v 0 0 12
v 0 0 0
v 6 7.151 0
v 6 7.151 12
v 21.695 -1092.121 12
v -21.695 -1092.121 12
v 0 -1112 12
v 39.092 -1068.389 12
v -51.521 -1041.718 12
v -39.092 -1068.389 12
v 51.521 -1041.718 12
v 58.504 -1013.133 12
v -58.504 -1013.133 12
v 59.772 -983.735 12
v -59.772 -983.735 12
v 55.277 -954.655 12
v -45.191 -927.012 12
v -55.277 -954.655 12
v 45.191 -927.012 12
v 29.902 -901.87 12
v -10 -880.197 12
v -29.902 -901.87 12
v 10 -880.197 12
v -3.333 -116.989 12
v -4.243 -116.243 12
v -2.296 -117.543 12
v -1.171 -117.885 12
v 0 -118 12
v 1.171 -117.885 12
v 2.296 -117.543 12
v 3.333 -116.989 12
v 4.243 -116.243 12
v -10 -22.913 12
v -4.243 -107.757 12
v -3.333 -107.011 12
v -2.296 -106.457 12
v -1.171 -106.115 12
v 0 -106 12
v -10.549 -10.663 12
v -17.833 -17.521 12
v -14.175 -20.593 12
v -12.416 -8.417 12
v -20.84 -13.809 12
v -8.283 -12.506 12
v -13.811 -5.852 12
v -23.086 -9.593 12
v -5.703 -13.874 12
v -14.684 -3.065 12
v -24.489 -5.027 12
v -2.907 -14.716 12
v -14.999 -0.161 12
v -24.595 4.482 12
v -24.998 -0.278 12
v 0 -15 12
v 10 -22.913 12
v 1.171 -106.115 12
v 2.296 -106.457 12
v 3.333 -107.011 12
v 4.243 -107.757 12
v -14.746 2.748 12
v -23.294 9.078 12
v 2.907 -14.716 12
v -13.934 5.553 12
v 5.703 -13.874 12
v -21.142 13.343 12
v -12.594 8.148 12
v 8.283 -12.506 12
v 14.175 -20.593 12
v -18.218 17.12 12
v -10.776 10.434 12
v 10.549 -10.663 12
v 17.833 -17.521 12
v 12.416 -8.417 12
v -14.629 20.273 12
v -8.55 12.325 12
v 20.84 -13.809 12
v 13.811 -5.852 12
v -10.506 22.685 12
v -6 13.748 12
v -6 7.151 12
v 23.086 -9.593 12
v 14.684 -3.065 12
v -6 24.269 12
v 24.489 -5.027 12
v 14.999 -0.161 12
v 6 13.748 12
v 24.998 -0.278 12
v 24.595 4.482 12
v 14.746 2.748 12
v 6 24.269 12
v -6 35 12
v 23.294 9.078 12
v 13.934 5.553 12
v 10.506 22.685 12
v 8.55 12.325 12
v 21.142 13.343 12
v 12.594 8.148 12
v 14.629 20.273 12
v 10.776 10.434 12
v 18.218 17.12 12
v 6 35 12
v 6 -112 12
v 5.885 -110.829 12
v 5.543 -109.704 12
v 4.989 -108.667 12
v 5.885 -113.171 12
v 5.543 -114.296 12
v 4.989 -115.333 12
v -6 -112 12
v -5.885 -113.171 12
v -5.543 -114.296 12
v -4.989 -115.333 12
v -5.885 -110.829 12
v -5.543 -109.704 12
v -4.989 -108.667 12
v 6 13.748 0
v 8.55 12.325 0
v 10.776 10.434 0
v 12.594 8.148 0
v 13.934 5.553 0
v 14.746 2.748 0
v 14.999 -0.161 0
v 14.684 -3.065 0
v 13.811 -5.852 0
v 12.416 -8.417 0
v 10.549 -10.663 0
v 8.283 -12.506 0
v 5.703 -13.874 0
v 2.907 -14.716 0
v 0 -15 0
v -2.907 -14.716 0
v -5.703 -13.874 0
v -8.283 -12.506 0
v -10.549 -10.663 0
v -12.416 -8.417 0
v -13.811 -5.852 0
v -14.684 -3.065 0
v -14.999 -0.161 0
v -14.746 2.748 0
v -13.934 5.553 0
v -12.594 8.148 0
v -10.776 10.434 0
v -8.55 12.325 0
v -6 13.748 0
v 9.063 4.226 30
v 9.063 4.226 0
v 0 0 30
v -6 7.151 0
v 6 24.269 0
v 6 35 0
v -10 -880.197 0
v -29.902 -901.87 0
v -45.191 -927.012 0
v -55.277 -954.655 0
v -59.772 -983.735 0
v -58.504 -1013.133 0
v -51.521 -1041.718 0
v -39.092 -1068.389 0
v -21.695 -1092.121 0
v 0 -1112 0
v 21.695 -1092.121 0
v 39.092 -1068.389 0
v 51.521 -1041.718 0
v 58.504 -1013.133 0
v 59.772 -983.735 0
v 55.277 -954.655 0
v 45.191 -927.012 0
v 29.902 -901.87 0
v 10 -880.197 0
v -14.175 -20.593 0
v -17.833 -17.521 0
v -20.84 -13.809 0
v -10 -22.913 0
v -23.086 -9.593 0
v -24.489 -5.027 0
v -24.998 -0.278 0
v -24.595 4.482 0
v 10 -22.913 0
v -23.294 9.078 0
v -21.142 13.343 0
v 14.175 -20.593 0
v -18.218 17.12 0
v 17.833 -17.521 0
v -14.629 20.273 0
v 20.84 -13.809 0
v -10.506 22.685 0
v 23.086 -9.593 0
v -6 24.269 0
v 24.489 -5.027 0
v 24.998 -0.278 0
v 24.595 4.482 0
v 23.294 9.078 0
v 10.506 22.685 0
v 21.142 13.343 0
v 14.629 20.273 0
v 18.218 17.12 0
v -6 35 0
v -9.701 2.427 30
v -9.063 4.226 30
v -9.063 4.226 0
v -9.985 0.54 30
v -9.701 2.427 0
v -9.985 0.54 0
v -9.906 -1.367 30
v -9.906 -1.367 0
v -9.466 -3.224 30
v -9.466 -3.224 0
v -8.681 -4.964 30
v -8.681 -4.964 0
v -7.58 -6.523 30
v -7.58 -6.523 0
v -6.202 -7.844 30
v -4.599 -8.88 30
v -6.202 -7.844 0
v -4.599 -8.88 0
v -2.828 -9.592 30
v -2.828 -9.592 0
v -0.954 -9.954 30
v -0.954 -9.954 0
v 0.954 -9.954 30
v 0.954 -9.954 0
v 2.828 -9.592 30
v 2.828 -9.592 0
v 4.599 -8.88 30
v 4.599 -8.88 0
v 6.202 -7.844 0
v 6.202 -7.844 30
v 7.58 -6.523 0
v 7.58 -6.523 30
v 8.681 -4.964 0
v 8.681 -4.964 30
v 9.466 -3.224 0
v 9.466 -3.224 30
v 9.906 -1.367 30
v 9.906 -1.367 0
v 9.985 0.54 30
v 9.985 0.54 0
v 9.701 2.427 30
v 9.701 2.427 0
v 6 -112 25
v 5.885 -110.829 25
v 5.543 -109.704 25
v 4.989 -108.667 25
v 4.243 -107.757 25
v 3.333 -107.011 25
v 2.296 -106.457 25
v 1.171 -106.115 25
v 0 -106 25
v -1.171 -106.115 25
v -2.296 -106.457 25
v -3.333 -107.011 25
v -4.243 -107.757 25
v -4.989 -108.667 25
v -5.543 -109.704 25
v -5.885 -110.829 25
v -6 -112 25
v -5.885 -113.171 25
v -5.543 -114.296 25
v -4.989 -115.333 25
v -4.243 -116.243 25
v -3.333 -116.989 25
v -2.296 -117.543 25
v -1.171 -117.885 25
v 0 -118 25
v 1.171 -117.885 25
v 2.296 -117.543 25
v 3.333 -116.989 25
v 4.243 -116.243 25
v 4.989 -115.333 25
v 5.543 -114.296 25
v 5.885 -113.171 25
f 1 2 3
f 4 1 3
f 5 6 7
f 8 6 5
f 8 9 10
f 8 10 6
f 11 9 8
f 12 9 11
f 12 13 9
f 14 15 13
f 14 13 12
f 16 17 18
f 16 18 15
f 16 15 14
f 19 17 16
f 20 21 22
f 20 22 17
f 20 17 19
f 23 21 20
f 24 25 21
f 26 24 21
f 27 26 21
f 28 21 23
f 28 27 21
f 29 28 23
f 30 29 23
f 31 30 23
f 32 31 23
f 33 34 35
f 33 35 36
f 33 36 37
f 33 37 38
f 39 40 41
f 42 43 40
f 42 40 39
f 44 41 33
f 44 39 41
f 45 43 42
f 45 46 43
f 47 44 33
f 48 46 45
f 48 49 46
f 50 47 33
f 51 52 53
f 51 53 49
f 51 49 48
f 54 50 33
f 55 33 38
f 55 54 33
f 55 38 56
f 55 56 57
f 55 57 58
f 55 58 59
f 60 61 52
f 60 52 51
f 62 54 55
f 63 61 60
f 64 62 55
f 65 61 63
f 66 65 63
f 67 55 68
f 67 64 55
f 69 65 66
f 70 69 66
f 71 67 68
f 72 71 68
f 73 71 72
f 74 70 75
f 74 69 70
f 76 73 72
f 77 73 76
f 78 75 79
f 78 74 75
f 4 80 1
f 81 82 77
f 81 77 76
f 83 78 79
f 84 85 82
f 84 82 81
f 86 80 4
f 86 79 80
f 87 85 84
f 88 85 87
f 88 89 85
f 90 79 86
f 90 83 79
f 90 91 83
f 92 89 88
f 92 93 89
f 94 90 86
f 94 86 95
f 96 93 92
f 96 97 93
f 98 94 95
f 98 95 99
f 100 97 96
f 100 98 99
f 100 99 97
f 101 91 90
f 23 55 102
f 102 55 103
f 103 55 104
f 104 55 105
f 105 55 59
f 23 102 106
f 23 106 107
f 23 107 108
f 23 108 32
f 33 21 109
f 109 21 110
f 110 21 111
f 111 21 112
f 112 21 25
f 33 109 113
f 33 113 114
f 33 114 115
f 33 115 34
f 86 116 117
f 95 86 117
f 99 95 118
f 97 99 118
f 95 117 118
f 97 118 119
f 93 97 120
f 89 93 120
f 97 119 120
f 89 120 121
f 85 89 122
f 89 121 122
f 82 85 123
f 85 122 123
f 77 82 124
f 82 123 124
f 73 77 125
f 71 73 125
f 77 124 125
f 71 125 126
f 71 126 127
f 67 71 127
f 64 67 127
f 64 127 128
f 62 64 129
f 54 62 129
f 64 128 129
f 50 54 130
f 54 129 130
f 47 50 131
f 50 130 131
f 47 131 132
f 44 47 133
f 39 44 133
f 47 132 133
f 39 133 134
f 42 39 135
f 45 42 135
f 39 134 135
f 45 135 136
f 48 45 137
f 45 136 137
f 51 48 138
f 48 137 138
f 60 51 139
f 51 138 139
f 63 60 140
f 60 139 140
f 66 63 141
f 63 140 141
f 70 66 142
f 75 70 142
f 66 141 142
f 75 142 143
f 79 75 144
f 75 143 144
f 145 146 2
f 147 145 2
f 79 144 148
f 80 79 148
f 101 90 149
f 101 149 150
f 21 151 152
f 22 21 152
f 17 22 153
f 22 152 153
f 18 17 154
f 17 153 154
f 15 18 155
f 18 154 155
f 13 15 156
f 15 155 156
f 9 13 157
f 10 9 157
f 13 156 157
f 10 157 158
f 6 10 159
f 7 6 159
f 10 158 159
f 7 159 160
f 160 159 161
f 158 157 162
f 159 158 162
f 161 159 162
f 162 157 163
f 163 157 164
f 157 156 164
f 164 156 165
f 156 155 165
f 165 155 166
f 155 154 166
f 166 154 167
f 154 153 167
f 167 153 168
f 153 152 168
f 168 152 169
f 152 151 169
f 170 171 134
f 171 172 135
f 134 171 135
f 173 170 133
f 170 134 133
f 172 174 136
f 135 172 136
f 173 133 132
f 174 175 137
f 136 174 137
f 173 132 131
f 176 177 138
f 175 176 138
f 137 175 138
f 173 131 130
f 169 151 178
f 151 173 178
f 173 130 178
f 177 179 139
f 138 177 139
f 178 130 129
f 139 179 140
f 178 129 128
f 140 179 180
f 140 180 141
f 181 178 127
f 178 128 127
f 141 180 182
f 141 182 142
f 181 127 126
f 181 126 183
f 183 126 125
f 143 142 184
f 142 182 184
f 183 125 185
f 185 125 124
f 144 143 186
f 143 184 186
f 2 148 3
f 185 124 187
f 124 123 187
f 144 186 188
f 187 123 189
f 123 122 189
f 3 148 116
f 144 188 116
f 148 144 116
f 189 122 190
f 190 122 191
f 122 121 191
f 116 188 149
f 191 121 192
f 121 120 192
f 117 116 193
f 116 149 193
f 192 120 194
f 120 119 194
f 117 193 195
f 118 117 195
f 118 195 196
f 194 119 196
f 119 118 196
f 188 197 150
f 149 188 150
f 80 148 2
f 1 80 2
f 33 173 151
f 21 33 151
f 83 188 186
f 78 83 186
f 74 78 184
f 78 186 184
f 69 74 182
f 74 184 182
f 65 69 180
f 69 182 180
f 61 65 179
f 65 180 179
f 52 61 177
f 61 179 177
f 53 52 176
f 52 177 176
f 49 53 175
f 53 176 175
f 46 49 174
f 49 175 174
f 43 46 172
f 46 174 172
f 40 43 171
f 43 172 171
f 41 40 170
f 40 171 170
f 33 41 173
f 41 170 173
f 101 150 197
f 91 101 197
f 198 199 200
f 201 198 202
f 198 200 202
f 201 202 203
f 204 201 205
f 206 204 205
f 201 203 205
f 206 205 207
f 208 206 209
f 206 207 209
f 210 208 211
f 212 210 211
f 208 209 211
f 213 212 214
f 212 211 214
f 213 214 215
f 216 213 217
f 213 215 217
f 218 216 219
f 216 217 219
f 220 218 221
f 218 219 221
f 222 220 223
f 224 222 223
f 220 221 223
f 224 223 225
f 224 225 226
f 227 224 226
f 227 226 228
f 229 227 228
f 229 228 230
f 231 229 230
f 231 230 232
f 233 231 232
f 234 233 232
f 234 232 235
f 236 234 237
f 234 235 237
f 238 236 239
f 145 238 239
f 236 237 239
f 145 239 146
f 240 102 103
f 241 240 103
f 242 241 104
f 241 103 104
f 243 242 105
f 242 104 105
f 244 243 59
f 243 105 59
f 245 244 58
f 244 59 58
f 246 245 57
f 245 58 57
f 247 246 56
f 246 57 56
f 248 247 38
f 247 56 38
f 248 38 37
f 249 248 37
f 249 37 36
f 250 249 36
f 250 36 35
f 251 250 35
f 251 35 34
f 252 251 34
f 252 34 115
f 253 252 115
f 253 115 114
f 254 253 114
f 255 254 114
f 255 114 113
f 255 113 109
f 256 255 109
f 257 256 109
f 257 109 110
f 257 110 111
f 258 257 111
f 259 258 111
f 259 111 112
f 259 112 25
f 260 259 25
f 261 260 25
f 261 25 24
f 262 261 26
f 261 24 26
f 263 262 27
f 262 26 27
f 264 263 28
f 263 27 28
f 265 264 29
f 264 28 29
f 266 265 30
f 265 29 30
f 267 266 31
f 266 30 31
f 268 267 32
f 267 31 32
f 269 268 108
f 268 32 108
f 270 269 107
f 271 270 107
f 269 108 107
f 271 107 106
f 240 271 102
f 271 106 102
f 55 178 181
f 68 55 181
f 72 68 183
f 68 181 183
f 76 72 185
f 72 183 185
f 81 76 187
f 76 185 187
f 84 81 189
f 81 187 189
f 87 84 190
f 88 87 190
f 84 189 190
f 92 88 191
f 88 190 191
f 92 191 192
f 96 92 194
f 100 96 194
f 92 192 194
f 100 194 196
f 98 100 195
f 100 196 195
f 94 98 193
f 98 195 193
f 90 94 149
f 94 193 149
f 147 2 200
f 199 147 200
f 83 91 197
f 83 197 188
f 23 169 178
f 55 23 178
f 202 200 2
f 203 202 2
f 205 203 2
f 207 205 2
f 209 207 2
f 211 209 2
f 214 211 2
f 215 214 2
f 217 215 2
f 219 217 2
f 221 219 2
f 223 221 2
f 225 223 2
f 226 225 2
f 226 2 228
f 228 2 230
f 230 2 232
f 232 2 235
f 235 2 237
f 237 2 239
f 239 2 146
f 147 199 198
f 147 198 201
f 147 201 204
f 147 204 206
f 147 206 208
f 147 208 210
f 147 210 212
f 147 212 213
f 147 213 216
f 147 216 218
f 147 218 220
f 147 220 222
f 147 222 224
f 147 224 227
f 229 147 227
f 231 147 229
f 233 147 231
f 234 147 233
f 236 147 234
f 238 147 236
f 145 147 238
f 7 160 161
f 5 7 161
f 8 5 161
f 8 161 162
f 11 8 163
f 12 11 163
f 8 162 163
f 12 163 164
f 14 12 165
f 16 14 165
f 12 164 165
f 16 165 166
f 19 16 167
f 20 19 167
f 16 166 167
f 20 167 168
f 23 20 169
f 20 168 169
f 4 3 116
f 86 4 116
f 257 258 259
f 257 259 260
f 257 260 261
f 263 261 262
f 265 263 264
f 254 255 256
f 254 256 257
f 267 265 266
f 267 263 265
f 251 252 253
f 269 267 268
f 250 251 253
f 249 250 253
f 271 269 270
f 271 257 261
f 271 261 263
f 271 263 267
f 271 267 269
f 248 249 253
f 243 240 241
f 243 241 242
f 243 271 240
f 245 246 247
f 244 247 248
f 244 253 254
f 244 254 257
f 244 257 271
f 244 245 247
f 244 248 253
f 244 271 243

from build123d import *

# Parameters (mm, degrees)
F1_DEPTH = 12
F3_DEPTH = 30
F4_R     = 6
F5_DEPTH = 25


with BuildPart() as f1:
    # F0 (on Top) → F1 (new body)
    with BuildSketch(Plane.XY):
        with BuildLine():
            Line((10, -880.196601), (10, -22.912878))
            ThreePointArc((10, -22.912878), (24.910641, 2.111868), (6, 24.269322))
            Line((6, 24.269322), (6, 35))
            Line((6, 35), (-6, 35))
            Line((-6, 35), (-6, 24.269322))
            ThreePointArc((-6, 24.269322), (-24.910641, 2.111868), (-10, -22.912878))
            Line((-10, -22.912878), (-10, -880.196601))
            ThreePointArc((-10, -880.196601), (-59.860615, -998.464988), (0, -1112))
            ThreePointArc((0, -1112), (59.860615, -998.464988), (10, -880.196601))
        make_face()
        with BuildLine():
            ThreePointArc((6, 13.747727), (0, -15), (-6, 13.747727))
            Line((-6, 13.747727), (-6, 7.150522))
            Line((-6, 7.150522), (0, 0))
            Line((0, 0), (6, 7.150522))
            Line((6, 7.150522), (6, 13.747727))
        make_face(mode=Mode.SUBTRACT)
    extrude(amount=F1_DEPTH)

    # F4 (on Top) → F5 (join)
    with BuildSketch(Plane.XY):
        with Locations((0, -112)):
            Circle(F4_R)
    extrude(amount=F5_DEPTH)


with BuildPart() as f3:
    # F2 (on Top) → F3 (new body)
    with BuildSketch(Plane.XY):
        with BuildLine():
            Line((0, 0), (-9.063078, 4.226183))
            ThreePointArc((-9.063078, 4.226183), (0, -10), (9.063078, 4.226183))
            Line((9.063078, 4.226183), (0, 0))
        make_face()
    extrude(amount=F3_DEPTH)


solid = Compound([f1.part, f3.part])
